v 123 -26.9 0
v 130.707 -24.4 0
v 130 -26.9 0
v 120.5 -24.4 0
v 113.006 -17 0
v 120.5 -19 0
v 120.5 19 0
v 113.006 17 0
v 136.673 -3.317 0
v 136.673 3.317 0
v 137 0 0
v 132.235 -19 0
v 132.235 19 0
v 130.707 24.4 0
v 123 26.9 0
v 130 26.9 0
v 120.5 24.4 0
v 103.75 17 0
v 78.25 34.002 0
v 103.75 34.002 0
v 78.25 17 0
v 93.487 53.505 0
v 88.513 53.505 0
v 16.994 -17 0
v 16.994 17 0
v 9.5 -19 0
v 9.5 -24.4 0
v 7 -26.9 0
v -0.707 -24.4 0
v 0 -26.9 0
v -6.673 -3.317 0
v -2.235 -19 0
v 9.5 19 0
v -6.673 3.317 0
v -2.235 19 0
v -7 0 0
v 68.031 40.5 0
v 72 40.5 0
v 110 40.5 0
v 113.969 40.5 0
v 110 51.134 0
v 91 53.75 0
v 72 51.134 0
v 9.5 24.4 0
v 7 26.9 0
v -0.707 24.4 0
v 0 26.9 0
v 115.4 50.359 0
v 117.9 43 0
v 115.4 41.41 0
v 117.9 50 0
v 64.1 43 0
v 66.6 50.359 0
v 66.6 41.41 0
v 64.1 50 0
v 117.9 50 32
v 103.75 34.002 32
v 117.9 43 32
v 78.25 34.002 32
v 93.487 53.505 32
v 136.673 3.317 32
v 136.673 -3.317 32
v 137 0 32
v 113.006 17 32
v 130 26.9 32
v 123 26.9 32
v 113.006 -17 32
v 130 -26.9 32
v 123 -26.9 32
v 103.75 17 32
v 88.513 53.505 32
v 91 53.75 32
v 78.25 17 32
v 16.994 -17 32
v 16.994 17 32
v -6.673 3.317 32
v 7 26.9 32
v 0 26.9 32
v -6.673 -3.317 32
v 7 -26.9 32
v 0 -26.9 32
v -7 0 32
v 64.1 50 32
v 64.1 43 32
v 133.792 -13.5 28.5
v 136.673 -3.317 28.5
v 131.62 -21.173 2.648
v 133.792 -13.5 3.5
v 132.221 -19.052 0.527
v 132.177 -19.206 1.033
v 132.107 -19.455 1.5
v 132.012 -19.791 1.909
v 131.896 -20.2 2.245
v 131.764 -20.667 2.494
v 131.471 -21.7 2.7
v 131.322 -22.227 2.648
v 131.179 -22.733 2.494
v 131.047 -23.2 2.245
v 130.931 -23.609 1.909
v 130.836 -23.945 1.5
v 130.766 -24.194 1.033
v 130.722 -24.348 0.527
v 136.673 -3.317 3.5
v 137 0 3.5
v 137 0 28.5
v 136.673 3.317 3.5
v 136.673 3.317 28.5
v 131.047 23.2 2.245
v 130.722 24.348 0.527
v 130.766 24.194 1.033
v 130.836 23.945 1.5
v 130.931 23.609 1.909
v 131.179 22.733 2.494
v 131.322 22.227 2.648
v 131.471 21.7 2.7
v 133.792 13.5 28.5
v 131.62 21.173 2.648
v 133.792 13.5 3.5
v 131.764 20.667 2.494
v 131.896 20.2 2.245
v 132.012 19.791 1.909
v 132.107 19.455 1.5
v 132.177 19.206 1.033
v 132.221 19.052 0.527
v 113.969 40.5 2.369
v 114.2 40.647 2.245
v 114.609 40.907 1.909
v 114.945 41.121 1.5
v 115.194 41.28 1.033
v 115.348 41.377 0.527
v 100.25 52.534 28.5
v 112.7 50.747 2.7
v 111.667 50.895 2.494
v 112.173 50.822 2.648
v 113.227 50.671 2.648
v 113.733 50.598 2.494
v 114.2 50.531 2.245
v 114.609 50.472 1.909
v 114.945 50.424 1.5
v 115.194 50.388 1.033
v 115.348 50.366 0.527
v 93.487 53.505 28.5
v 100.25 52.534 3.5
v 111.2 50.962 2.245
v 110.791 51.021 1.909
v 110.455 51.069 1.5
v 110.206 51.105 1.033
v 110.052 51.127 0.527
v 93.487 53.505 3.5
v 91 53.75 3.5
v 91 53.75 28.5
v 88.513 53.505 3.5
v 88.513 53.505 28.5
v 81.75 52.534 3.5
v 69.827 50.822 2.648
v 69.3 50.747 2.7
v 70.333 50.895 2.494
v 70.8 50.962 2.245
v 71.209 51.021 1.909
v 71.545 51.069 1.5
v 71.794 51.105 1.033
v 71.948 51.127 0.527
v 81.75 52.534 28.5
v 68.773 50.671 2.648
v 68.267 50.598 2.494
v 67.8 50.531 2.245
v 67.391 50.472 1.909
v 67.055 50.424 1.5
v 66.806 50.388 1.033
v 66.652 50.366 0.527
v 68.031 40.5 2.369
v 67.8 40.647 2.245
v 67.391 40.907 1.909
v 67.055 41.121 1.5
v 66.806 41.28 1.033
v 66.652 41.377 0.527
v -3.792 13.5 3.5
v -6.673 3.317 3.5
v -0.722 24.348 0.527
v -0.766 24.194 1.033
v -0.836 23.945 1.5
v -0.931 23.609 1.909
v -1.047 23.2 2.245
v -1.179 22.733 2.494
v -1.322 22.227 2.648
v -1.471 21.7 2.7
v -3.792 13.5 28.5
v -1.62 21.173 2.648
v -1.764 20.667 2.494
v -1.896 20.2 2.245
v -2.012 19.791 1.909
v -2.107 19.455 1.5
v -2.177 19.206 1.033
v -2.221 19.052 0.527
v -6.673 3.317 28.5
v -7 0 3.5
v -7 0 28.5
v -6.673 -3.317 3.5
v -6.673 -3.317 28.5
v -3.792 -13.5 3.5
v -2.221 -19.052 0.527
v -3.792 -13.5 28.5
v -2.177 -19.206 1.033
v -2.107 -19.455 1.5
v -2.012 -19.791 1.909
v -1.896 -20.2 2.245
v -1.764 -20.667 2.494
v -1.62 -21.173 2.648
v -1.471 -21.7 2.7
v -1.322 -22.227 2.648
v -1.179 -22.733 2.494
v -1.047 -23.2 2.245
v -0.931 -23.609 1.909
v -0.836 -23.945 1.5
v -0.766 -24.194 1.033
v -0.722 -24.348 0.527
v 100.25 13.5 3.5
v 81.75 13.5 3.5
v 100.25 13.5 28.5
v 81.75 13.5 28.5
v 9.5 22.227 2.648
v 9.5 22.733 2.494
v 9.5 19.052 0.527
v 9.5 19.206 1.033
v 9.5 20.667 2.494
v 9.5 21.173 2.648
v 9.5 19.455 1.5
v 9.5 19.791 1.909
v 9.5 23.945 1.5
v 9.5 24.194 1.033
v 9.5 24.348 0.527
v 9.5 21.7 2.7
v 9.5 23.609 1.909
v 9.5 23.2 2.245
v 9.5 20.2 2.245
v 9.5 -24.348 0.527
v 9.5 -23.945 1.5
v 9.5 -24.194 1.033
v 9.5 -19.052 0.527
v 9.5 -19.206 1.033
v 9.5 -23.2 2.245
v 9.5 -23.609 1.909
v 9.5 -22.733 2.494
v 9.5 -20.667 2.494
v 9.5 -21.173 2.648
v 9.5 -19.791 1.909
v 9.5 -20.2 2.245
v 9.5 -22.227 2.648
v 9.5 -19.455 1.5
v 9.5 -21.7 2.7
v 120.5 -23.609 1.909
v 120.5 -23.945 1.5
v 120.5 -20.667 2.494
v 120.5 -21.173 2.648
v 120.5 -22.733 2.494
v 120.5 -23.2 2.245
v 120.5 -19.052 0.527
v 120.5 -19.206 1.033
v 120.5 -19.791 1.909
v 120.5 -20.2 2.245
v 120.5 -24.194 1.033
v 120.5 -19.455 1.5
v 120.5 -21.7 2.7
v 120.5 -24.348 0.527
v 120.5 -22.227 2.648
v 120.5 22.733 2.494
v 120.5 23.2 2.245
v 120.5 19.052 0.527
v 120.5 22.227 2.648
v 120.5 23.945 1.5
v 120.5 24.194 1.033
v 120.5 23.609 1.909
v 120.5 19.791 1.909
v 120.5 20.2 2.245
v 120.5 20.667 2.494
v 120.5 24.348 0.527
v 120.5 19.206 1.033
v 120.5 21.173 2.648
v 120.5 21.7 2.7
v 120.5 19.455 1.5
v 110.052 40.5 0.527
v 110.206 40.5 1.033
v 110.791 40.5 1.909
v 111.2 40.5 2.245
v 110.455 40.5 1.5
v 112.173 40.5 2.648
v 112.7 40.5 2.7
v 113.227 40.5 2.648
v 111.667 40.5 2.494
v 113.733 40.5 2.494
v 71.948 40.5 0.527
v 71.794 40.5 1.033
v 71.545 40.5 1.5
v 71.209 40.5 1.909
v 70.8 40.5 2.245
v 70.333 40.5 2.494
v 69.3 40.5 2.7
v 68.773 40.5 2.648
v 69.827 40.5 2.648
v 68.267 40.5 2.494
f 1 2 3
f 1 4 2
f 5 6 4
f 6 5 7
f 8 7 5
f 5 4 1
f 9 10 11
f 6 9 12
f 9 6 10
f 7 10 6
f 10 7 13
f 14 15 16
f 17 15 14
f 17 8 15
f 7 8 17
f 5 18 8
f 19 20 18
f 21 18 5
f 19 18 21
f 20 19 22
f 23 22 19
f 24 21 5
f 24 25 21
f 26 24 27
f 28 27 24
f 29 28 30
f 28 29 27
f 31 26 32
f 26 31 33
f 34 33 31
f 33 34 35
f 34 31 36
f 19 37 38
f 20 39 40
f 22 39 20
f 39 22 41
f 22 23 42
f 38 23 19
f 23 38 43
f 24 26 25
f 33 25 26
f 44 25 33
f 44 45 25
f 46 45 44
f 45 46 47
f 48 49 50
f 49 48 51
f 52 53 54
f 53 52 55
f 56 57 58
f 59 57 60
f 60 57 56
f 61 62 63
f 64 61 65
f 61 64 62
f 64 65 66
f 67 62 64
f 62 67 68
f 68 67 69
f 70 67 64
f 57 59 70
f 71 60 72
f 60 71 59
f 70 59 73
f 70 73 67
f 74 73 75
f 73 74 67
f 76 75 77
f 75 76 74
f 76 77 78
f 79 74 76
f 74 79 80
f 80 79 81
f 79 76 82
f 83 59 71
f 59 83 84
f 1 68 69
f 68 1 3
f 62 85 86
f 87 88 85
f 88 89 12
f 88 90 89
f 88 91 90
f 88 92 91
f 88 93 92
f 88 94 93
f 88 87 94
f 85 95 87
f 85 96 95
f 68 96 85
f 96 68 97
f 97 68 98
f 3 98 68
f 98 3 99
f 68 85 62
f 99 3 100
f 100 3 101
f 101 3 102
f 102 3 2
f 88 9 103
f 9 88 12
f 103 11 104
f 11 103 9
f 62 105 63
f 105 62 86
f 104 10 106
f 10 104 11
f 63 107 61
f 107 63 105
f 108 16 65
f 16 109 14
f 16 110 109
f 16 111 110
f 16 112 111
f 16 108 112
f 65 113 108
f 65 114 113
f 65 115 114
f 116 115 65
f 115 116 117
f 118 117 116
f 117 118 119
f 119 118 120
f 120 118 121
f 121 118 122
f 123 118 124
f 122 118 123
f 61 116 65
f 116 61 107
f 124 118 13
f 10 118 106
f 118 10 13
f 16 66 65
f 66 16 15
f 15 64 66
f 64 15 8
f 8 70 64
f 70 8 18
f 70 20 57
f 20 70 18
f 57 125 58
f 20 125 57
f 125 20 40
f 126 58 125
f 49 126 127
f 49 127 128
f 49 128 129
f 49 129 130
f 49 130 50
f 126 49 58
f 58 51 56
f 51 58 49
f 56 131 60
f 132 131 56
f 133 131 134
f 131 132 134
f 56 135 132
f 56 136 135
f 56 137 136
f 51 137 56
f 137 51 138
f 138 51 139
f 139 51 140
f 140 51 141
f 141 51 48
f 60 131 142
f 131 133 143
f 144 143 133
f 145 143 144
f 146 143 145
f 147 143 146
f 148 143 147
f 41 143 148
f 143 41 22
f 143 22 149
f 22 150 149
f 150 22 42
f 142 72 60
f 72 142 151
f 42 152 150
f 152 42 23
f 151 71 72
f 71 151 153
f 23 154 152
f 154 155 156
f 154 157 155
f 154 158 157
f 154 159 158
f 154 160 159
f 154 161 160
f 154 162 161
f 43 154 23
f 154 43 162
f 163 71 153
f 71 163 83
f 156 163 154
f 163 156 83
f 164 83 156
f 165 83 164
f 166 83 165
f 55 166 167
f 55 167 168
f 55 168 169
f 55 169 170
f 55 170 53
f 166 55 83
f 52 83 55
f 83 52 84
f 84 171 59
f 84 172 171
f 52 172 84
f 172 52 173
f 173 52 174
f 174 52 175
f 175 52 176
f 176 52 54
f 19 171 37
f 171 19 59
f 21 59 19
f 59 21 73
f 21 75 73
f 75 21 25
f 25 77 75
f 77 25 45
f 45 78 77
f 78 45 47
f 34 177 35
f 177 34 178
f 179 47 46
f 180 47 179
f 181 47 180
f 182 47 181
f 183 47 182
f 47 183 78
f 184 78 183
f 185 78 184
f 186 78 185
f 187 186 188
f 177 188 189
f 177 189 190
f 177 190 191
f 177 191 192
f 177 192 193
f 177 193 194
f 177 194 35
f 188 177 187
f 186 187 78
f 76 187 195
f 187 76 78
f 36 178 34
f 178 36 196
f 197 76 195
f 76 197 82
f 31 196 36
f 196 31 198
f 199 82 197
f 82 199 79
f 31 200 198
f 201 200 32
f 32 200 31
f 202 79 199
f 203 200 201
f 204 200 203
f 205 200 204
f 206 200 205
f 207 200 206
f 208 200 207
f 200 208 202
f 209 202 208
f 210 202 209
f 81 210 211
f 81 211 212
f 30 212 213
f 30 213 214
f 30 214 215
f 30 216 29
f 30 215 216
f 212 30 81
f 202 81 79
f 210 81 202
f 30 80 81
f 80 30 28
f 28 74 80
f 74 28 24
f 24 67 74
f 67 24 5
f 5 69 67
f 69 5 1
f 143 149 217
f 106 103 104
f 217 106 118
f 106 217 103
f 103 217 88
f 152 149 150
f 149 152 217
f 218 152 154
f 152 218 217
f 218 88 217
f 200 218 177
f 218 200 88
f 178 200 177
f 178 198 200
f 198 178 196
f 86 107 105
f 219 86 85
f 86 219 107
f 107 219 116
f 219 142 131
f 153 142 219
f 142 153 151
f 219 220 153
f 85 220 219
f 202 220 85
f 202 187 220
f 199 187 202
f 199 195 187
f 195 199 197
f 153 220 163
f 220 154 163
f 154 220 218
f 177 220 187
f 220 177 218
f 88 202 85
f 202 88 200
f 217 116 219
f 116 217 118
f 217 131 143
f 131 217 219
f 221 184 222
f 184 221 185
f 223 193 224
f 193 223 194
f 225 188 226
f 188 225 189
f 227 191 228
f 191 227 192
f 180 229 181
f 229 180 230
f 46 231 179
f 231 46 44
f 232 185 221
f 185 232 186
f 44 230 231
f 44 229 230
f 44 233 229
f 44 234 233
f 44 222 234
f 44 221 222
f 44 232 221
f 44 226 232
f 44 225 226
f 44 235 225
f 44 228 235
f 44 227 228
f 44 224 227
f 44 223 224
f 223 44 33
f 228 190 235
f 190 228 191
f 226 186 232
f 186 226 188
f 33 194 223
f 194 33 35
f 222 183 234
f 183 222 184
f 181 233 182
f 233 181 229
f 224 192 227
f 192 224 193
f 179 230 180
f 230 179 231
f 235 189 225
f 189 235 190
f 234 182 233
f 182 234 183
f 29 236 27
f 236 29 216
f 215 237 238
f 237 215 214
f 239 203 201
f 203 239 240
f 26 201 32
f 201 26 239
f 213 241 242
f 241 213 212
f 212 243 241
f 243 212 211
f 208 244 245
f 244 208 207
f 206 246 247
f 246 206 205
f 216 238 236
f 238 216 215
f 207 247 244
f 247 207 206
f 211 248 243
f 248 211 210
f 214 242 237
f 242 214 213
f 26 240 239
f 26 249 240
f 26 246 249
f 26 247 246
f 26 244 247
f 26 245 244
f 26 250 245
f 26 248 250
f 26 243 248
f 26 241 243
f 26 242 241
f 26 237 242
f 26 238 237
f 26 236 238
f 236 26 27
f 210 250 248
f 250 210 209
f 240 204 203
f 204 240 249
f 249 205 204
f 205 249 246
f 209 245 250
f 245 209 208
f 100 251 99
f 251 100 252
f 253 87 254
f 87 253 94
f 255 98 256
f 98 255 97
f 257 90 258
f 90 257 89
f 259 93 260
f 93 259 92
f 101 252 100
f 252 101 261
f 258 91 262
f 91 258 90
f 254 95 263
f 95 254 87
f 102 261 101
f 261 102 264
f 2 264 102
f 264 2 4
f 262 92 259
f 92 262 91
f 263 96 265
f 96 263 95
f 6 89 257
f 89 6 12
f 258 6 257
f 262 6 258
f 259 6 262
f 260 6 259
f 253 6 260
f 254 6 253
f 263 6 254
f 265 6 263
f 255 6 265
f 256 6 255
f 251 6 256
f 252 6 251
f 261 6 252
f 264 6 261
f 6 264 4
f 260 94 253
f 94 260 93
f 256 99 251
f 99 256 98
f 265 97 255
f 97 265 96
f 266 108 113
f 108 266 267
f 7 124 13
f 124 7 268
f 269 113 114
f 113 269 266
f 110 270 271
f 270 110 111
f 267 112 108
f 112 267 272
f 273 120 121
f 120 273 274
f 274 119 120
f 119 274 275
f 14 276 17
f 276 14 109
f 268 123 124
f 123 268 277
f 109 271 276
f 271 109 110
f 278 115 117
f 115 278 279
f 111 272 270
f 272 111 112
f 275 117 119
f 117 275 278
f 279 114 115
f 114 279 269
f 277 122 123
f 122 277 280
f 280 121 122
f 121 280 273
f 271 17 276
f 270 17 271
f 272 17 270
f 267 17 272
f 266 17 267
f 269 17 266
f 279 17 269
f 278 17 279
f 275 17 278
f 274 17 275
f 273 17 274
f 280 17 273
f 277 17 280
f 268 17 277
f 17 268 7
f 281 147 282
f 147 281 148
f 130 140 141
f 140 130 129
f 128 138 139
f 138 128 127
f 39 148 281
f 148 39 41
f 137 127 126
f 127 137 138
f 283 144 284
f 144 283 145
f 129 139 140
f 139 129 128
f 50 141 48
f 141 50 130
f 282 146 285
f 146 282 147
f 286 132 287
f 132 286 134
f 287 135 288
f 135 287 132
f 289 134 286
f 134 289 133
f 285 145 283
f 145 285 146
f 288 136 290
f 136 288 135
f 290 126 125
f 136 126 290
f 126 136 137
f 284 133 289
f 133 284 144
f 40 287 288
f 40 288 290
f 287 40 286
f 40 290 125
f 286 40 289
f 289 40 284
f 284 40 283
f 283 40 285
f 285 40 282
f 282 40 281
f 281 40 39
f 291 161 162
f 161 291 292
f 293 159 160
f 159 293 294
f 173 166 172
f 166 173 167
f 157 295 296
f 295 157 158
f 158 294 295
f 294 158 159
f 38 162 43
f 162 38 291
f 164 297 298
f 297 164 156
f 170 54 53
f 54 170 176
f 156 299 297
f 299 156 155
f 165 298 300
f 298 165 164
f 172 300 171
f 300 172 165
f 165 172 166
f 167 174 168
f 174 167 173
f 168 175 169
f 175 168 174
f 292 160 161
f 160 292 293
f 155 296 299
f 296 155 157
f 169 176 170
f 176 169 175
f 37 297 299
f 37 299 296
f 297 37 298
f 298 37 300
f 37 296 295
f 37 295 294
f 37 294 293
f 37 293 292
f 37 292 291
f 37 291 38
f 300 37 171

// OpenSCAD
$fn = 32;

// ----------------------------------------------------------------------
// Air duct: 34 mm duct, 3.5 mm wall, 32 mm across
// ----------------------------------------------------------------------

// --- parameters (mm) ---
duct_r = 17;              // duct core radius
duct_d = 34;              // duct core diameter
wall = 3.5;               // duct wall thickness
height = 32;              // duct width (extrusion height)
port_r = 26.9;            // port flange half width
port_d = 53.8;            // port flange width
port_t = 7;               // port flange thickness
bolt_d = 5.4;             // port bolt holes
bolt_offset = 21.7;       // bolt hole offset from the port axis
branch_r = 12.75;         // branch core radius
branch_d = 25.5;          // branch core diameter
branch_len = 50;          // branch length from the run axis

difference() {
  /* outer hull chain: tube with a flat flange plate at every port */
  linear_extrude(height = 32) {
    hull() {
      polygon([[0, -26.9], [0, 26.9], [7, 26.9], [7, -26.9]]);
      translate([10, 0]) circle(r = 17);
    }
    hull() {
      translate([10, 0]) circle(r = 17);
      translate([39, 0]) circle(r = 17);
    }
    hull() {
      translate([39, 0]) circle(r = 17);
      translate([91, 0]) circle(r = 17);
    }
    hull() {
      translate([91, 0]) circle(r = 17);
      translate([120, 0]) circle(r = 17);
    }
    hull() {
      translate([120, 0]) circle(r = 17);
      polygon([[130, 26.9], [130, -26.9], [123, -26.9], [123, 26.9]]);
    }
    hull() {
      translate([91, 0]) circle(r = 12.75);
      translate([91, 27.5]) circle(r = 12.75);
    }
    hull() {
      translate([91, 27.5]) circle(r = 12.75);
      translate([91, 41]) circle(r = 12.75);
    }
    hull() {
      translate([91, 41]) circle(r = 12.75);
      polygon([[64.1, 50], [117.9, 50], [117.9, 43], [64.1, 43]]);
    }
  }
  /* air passage: the same chain inset by the wall, 5 mm proud of the ports */
  translate([0, 0, 3.5]) linear_extrude(height = 25) {
    hull() {
      translate([-5, 0]) circle(r = 13.5);
      translate([39, 0]) circle(r = 13.5);
    }
    hull() {
      translate([39, 0]) circle(r = 13.5);
      translate([91, 0]) circle(r = 13.5);
    }
    hull() {
      translate([91, 0]) circle(r = 13.5);
      translate([135, 0]) circle(r = 13.5);
    }
    hull() {
      translate([91, 0]) circle(r = 9.25);
      translate([91, 27.5]) circle(r = 9.25);
    }
    hull() {
      translate([91, 27.5]) circle(r = 9.25);
      translate([91, 55]) circle(r = 9.25);
    }
  }
  translate([0, 0]) rotate([0, 0, -90]) translate([-21.7, -2.5]) rotate([-90, 0, 0]) cylinder(h = 12, d = 5.4);
  translate([0, 0]) rotate([0, 0, -90]) translate([21.7, -2.5]) rotate([-90, 0, 0]) cylinder(h = 12, d = 5.4);
  translate([130, 0]) rotate([0, 0, 90]) translate([-21.7, -2.5]) rotate([-90, 0, 0]) cylinder(h = 12, d = 5.4);
  translate([130, 0]) rotate([0, 0, 90]) translate([21.7, -2.5]) rotate([-90, 0, 0]) cylinder(h = 12, d = 5.4);
  translate([91, 50]) rotate([0, 0, 180]) translate([-21.7, -2.5]) rotate([-90, 0, 0]) cylinder(h = 12, d = 5.4);
  translate([91, 50]) rotate([0, 0, 180]) translate([21.7, -2.5]) rotate([-90, 0, 0]) cylinder(h = 12, d = 5.4);
}
